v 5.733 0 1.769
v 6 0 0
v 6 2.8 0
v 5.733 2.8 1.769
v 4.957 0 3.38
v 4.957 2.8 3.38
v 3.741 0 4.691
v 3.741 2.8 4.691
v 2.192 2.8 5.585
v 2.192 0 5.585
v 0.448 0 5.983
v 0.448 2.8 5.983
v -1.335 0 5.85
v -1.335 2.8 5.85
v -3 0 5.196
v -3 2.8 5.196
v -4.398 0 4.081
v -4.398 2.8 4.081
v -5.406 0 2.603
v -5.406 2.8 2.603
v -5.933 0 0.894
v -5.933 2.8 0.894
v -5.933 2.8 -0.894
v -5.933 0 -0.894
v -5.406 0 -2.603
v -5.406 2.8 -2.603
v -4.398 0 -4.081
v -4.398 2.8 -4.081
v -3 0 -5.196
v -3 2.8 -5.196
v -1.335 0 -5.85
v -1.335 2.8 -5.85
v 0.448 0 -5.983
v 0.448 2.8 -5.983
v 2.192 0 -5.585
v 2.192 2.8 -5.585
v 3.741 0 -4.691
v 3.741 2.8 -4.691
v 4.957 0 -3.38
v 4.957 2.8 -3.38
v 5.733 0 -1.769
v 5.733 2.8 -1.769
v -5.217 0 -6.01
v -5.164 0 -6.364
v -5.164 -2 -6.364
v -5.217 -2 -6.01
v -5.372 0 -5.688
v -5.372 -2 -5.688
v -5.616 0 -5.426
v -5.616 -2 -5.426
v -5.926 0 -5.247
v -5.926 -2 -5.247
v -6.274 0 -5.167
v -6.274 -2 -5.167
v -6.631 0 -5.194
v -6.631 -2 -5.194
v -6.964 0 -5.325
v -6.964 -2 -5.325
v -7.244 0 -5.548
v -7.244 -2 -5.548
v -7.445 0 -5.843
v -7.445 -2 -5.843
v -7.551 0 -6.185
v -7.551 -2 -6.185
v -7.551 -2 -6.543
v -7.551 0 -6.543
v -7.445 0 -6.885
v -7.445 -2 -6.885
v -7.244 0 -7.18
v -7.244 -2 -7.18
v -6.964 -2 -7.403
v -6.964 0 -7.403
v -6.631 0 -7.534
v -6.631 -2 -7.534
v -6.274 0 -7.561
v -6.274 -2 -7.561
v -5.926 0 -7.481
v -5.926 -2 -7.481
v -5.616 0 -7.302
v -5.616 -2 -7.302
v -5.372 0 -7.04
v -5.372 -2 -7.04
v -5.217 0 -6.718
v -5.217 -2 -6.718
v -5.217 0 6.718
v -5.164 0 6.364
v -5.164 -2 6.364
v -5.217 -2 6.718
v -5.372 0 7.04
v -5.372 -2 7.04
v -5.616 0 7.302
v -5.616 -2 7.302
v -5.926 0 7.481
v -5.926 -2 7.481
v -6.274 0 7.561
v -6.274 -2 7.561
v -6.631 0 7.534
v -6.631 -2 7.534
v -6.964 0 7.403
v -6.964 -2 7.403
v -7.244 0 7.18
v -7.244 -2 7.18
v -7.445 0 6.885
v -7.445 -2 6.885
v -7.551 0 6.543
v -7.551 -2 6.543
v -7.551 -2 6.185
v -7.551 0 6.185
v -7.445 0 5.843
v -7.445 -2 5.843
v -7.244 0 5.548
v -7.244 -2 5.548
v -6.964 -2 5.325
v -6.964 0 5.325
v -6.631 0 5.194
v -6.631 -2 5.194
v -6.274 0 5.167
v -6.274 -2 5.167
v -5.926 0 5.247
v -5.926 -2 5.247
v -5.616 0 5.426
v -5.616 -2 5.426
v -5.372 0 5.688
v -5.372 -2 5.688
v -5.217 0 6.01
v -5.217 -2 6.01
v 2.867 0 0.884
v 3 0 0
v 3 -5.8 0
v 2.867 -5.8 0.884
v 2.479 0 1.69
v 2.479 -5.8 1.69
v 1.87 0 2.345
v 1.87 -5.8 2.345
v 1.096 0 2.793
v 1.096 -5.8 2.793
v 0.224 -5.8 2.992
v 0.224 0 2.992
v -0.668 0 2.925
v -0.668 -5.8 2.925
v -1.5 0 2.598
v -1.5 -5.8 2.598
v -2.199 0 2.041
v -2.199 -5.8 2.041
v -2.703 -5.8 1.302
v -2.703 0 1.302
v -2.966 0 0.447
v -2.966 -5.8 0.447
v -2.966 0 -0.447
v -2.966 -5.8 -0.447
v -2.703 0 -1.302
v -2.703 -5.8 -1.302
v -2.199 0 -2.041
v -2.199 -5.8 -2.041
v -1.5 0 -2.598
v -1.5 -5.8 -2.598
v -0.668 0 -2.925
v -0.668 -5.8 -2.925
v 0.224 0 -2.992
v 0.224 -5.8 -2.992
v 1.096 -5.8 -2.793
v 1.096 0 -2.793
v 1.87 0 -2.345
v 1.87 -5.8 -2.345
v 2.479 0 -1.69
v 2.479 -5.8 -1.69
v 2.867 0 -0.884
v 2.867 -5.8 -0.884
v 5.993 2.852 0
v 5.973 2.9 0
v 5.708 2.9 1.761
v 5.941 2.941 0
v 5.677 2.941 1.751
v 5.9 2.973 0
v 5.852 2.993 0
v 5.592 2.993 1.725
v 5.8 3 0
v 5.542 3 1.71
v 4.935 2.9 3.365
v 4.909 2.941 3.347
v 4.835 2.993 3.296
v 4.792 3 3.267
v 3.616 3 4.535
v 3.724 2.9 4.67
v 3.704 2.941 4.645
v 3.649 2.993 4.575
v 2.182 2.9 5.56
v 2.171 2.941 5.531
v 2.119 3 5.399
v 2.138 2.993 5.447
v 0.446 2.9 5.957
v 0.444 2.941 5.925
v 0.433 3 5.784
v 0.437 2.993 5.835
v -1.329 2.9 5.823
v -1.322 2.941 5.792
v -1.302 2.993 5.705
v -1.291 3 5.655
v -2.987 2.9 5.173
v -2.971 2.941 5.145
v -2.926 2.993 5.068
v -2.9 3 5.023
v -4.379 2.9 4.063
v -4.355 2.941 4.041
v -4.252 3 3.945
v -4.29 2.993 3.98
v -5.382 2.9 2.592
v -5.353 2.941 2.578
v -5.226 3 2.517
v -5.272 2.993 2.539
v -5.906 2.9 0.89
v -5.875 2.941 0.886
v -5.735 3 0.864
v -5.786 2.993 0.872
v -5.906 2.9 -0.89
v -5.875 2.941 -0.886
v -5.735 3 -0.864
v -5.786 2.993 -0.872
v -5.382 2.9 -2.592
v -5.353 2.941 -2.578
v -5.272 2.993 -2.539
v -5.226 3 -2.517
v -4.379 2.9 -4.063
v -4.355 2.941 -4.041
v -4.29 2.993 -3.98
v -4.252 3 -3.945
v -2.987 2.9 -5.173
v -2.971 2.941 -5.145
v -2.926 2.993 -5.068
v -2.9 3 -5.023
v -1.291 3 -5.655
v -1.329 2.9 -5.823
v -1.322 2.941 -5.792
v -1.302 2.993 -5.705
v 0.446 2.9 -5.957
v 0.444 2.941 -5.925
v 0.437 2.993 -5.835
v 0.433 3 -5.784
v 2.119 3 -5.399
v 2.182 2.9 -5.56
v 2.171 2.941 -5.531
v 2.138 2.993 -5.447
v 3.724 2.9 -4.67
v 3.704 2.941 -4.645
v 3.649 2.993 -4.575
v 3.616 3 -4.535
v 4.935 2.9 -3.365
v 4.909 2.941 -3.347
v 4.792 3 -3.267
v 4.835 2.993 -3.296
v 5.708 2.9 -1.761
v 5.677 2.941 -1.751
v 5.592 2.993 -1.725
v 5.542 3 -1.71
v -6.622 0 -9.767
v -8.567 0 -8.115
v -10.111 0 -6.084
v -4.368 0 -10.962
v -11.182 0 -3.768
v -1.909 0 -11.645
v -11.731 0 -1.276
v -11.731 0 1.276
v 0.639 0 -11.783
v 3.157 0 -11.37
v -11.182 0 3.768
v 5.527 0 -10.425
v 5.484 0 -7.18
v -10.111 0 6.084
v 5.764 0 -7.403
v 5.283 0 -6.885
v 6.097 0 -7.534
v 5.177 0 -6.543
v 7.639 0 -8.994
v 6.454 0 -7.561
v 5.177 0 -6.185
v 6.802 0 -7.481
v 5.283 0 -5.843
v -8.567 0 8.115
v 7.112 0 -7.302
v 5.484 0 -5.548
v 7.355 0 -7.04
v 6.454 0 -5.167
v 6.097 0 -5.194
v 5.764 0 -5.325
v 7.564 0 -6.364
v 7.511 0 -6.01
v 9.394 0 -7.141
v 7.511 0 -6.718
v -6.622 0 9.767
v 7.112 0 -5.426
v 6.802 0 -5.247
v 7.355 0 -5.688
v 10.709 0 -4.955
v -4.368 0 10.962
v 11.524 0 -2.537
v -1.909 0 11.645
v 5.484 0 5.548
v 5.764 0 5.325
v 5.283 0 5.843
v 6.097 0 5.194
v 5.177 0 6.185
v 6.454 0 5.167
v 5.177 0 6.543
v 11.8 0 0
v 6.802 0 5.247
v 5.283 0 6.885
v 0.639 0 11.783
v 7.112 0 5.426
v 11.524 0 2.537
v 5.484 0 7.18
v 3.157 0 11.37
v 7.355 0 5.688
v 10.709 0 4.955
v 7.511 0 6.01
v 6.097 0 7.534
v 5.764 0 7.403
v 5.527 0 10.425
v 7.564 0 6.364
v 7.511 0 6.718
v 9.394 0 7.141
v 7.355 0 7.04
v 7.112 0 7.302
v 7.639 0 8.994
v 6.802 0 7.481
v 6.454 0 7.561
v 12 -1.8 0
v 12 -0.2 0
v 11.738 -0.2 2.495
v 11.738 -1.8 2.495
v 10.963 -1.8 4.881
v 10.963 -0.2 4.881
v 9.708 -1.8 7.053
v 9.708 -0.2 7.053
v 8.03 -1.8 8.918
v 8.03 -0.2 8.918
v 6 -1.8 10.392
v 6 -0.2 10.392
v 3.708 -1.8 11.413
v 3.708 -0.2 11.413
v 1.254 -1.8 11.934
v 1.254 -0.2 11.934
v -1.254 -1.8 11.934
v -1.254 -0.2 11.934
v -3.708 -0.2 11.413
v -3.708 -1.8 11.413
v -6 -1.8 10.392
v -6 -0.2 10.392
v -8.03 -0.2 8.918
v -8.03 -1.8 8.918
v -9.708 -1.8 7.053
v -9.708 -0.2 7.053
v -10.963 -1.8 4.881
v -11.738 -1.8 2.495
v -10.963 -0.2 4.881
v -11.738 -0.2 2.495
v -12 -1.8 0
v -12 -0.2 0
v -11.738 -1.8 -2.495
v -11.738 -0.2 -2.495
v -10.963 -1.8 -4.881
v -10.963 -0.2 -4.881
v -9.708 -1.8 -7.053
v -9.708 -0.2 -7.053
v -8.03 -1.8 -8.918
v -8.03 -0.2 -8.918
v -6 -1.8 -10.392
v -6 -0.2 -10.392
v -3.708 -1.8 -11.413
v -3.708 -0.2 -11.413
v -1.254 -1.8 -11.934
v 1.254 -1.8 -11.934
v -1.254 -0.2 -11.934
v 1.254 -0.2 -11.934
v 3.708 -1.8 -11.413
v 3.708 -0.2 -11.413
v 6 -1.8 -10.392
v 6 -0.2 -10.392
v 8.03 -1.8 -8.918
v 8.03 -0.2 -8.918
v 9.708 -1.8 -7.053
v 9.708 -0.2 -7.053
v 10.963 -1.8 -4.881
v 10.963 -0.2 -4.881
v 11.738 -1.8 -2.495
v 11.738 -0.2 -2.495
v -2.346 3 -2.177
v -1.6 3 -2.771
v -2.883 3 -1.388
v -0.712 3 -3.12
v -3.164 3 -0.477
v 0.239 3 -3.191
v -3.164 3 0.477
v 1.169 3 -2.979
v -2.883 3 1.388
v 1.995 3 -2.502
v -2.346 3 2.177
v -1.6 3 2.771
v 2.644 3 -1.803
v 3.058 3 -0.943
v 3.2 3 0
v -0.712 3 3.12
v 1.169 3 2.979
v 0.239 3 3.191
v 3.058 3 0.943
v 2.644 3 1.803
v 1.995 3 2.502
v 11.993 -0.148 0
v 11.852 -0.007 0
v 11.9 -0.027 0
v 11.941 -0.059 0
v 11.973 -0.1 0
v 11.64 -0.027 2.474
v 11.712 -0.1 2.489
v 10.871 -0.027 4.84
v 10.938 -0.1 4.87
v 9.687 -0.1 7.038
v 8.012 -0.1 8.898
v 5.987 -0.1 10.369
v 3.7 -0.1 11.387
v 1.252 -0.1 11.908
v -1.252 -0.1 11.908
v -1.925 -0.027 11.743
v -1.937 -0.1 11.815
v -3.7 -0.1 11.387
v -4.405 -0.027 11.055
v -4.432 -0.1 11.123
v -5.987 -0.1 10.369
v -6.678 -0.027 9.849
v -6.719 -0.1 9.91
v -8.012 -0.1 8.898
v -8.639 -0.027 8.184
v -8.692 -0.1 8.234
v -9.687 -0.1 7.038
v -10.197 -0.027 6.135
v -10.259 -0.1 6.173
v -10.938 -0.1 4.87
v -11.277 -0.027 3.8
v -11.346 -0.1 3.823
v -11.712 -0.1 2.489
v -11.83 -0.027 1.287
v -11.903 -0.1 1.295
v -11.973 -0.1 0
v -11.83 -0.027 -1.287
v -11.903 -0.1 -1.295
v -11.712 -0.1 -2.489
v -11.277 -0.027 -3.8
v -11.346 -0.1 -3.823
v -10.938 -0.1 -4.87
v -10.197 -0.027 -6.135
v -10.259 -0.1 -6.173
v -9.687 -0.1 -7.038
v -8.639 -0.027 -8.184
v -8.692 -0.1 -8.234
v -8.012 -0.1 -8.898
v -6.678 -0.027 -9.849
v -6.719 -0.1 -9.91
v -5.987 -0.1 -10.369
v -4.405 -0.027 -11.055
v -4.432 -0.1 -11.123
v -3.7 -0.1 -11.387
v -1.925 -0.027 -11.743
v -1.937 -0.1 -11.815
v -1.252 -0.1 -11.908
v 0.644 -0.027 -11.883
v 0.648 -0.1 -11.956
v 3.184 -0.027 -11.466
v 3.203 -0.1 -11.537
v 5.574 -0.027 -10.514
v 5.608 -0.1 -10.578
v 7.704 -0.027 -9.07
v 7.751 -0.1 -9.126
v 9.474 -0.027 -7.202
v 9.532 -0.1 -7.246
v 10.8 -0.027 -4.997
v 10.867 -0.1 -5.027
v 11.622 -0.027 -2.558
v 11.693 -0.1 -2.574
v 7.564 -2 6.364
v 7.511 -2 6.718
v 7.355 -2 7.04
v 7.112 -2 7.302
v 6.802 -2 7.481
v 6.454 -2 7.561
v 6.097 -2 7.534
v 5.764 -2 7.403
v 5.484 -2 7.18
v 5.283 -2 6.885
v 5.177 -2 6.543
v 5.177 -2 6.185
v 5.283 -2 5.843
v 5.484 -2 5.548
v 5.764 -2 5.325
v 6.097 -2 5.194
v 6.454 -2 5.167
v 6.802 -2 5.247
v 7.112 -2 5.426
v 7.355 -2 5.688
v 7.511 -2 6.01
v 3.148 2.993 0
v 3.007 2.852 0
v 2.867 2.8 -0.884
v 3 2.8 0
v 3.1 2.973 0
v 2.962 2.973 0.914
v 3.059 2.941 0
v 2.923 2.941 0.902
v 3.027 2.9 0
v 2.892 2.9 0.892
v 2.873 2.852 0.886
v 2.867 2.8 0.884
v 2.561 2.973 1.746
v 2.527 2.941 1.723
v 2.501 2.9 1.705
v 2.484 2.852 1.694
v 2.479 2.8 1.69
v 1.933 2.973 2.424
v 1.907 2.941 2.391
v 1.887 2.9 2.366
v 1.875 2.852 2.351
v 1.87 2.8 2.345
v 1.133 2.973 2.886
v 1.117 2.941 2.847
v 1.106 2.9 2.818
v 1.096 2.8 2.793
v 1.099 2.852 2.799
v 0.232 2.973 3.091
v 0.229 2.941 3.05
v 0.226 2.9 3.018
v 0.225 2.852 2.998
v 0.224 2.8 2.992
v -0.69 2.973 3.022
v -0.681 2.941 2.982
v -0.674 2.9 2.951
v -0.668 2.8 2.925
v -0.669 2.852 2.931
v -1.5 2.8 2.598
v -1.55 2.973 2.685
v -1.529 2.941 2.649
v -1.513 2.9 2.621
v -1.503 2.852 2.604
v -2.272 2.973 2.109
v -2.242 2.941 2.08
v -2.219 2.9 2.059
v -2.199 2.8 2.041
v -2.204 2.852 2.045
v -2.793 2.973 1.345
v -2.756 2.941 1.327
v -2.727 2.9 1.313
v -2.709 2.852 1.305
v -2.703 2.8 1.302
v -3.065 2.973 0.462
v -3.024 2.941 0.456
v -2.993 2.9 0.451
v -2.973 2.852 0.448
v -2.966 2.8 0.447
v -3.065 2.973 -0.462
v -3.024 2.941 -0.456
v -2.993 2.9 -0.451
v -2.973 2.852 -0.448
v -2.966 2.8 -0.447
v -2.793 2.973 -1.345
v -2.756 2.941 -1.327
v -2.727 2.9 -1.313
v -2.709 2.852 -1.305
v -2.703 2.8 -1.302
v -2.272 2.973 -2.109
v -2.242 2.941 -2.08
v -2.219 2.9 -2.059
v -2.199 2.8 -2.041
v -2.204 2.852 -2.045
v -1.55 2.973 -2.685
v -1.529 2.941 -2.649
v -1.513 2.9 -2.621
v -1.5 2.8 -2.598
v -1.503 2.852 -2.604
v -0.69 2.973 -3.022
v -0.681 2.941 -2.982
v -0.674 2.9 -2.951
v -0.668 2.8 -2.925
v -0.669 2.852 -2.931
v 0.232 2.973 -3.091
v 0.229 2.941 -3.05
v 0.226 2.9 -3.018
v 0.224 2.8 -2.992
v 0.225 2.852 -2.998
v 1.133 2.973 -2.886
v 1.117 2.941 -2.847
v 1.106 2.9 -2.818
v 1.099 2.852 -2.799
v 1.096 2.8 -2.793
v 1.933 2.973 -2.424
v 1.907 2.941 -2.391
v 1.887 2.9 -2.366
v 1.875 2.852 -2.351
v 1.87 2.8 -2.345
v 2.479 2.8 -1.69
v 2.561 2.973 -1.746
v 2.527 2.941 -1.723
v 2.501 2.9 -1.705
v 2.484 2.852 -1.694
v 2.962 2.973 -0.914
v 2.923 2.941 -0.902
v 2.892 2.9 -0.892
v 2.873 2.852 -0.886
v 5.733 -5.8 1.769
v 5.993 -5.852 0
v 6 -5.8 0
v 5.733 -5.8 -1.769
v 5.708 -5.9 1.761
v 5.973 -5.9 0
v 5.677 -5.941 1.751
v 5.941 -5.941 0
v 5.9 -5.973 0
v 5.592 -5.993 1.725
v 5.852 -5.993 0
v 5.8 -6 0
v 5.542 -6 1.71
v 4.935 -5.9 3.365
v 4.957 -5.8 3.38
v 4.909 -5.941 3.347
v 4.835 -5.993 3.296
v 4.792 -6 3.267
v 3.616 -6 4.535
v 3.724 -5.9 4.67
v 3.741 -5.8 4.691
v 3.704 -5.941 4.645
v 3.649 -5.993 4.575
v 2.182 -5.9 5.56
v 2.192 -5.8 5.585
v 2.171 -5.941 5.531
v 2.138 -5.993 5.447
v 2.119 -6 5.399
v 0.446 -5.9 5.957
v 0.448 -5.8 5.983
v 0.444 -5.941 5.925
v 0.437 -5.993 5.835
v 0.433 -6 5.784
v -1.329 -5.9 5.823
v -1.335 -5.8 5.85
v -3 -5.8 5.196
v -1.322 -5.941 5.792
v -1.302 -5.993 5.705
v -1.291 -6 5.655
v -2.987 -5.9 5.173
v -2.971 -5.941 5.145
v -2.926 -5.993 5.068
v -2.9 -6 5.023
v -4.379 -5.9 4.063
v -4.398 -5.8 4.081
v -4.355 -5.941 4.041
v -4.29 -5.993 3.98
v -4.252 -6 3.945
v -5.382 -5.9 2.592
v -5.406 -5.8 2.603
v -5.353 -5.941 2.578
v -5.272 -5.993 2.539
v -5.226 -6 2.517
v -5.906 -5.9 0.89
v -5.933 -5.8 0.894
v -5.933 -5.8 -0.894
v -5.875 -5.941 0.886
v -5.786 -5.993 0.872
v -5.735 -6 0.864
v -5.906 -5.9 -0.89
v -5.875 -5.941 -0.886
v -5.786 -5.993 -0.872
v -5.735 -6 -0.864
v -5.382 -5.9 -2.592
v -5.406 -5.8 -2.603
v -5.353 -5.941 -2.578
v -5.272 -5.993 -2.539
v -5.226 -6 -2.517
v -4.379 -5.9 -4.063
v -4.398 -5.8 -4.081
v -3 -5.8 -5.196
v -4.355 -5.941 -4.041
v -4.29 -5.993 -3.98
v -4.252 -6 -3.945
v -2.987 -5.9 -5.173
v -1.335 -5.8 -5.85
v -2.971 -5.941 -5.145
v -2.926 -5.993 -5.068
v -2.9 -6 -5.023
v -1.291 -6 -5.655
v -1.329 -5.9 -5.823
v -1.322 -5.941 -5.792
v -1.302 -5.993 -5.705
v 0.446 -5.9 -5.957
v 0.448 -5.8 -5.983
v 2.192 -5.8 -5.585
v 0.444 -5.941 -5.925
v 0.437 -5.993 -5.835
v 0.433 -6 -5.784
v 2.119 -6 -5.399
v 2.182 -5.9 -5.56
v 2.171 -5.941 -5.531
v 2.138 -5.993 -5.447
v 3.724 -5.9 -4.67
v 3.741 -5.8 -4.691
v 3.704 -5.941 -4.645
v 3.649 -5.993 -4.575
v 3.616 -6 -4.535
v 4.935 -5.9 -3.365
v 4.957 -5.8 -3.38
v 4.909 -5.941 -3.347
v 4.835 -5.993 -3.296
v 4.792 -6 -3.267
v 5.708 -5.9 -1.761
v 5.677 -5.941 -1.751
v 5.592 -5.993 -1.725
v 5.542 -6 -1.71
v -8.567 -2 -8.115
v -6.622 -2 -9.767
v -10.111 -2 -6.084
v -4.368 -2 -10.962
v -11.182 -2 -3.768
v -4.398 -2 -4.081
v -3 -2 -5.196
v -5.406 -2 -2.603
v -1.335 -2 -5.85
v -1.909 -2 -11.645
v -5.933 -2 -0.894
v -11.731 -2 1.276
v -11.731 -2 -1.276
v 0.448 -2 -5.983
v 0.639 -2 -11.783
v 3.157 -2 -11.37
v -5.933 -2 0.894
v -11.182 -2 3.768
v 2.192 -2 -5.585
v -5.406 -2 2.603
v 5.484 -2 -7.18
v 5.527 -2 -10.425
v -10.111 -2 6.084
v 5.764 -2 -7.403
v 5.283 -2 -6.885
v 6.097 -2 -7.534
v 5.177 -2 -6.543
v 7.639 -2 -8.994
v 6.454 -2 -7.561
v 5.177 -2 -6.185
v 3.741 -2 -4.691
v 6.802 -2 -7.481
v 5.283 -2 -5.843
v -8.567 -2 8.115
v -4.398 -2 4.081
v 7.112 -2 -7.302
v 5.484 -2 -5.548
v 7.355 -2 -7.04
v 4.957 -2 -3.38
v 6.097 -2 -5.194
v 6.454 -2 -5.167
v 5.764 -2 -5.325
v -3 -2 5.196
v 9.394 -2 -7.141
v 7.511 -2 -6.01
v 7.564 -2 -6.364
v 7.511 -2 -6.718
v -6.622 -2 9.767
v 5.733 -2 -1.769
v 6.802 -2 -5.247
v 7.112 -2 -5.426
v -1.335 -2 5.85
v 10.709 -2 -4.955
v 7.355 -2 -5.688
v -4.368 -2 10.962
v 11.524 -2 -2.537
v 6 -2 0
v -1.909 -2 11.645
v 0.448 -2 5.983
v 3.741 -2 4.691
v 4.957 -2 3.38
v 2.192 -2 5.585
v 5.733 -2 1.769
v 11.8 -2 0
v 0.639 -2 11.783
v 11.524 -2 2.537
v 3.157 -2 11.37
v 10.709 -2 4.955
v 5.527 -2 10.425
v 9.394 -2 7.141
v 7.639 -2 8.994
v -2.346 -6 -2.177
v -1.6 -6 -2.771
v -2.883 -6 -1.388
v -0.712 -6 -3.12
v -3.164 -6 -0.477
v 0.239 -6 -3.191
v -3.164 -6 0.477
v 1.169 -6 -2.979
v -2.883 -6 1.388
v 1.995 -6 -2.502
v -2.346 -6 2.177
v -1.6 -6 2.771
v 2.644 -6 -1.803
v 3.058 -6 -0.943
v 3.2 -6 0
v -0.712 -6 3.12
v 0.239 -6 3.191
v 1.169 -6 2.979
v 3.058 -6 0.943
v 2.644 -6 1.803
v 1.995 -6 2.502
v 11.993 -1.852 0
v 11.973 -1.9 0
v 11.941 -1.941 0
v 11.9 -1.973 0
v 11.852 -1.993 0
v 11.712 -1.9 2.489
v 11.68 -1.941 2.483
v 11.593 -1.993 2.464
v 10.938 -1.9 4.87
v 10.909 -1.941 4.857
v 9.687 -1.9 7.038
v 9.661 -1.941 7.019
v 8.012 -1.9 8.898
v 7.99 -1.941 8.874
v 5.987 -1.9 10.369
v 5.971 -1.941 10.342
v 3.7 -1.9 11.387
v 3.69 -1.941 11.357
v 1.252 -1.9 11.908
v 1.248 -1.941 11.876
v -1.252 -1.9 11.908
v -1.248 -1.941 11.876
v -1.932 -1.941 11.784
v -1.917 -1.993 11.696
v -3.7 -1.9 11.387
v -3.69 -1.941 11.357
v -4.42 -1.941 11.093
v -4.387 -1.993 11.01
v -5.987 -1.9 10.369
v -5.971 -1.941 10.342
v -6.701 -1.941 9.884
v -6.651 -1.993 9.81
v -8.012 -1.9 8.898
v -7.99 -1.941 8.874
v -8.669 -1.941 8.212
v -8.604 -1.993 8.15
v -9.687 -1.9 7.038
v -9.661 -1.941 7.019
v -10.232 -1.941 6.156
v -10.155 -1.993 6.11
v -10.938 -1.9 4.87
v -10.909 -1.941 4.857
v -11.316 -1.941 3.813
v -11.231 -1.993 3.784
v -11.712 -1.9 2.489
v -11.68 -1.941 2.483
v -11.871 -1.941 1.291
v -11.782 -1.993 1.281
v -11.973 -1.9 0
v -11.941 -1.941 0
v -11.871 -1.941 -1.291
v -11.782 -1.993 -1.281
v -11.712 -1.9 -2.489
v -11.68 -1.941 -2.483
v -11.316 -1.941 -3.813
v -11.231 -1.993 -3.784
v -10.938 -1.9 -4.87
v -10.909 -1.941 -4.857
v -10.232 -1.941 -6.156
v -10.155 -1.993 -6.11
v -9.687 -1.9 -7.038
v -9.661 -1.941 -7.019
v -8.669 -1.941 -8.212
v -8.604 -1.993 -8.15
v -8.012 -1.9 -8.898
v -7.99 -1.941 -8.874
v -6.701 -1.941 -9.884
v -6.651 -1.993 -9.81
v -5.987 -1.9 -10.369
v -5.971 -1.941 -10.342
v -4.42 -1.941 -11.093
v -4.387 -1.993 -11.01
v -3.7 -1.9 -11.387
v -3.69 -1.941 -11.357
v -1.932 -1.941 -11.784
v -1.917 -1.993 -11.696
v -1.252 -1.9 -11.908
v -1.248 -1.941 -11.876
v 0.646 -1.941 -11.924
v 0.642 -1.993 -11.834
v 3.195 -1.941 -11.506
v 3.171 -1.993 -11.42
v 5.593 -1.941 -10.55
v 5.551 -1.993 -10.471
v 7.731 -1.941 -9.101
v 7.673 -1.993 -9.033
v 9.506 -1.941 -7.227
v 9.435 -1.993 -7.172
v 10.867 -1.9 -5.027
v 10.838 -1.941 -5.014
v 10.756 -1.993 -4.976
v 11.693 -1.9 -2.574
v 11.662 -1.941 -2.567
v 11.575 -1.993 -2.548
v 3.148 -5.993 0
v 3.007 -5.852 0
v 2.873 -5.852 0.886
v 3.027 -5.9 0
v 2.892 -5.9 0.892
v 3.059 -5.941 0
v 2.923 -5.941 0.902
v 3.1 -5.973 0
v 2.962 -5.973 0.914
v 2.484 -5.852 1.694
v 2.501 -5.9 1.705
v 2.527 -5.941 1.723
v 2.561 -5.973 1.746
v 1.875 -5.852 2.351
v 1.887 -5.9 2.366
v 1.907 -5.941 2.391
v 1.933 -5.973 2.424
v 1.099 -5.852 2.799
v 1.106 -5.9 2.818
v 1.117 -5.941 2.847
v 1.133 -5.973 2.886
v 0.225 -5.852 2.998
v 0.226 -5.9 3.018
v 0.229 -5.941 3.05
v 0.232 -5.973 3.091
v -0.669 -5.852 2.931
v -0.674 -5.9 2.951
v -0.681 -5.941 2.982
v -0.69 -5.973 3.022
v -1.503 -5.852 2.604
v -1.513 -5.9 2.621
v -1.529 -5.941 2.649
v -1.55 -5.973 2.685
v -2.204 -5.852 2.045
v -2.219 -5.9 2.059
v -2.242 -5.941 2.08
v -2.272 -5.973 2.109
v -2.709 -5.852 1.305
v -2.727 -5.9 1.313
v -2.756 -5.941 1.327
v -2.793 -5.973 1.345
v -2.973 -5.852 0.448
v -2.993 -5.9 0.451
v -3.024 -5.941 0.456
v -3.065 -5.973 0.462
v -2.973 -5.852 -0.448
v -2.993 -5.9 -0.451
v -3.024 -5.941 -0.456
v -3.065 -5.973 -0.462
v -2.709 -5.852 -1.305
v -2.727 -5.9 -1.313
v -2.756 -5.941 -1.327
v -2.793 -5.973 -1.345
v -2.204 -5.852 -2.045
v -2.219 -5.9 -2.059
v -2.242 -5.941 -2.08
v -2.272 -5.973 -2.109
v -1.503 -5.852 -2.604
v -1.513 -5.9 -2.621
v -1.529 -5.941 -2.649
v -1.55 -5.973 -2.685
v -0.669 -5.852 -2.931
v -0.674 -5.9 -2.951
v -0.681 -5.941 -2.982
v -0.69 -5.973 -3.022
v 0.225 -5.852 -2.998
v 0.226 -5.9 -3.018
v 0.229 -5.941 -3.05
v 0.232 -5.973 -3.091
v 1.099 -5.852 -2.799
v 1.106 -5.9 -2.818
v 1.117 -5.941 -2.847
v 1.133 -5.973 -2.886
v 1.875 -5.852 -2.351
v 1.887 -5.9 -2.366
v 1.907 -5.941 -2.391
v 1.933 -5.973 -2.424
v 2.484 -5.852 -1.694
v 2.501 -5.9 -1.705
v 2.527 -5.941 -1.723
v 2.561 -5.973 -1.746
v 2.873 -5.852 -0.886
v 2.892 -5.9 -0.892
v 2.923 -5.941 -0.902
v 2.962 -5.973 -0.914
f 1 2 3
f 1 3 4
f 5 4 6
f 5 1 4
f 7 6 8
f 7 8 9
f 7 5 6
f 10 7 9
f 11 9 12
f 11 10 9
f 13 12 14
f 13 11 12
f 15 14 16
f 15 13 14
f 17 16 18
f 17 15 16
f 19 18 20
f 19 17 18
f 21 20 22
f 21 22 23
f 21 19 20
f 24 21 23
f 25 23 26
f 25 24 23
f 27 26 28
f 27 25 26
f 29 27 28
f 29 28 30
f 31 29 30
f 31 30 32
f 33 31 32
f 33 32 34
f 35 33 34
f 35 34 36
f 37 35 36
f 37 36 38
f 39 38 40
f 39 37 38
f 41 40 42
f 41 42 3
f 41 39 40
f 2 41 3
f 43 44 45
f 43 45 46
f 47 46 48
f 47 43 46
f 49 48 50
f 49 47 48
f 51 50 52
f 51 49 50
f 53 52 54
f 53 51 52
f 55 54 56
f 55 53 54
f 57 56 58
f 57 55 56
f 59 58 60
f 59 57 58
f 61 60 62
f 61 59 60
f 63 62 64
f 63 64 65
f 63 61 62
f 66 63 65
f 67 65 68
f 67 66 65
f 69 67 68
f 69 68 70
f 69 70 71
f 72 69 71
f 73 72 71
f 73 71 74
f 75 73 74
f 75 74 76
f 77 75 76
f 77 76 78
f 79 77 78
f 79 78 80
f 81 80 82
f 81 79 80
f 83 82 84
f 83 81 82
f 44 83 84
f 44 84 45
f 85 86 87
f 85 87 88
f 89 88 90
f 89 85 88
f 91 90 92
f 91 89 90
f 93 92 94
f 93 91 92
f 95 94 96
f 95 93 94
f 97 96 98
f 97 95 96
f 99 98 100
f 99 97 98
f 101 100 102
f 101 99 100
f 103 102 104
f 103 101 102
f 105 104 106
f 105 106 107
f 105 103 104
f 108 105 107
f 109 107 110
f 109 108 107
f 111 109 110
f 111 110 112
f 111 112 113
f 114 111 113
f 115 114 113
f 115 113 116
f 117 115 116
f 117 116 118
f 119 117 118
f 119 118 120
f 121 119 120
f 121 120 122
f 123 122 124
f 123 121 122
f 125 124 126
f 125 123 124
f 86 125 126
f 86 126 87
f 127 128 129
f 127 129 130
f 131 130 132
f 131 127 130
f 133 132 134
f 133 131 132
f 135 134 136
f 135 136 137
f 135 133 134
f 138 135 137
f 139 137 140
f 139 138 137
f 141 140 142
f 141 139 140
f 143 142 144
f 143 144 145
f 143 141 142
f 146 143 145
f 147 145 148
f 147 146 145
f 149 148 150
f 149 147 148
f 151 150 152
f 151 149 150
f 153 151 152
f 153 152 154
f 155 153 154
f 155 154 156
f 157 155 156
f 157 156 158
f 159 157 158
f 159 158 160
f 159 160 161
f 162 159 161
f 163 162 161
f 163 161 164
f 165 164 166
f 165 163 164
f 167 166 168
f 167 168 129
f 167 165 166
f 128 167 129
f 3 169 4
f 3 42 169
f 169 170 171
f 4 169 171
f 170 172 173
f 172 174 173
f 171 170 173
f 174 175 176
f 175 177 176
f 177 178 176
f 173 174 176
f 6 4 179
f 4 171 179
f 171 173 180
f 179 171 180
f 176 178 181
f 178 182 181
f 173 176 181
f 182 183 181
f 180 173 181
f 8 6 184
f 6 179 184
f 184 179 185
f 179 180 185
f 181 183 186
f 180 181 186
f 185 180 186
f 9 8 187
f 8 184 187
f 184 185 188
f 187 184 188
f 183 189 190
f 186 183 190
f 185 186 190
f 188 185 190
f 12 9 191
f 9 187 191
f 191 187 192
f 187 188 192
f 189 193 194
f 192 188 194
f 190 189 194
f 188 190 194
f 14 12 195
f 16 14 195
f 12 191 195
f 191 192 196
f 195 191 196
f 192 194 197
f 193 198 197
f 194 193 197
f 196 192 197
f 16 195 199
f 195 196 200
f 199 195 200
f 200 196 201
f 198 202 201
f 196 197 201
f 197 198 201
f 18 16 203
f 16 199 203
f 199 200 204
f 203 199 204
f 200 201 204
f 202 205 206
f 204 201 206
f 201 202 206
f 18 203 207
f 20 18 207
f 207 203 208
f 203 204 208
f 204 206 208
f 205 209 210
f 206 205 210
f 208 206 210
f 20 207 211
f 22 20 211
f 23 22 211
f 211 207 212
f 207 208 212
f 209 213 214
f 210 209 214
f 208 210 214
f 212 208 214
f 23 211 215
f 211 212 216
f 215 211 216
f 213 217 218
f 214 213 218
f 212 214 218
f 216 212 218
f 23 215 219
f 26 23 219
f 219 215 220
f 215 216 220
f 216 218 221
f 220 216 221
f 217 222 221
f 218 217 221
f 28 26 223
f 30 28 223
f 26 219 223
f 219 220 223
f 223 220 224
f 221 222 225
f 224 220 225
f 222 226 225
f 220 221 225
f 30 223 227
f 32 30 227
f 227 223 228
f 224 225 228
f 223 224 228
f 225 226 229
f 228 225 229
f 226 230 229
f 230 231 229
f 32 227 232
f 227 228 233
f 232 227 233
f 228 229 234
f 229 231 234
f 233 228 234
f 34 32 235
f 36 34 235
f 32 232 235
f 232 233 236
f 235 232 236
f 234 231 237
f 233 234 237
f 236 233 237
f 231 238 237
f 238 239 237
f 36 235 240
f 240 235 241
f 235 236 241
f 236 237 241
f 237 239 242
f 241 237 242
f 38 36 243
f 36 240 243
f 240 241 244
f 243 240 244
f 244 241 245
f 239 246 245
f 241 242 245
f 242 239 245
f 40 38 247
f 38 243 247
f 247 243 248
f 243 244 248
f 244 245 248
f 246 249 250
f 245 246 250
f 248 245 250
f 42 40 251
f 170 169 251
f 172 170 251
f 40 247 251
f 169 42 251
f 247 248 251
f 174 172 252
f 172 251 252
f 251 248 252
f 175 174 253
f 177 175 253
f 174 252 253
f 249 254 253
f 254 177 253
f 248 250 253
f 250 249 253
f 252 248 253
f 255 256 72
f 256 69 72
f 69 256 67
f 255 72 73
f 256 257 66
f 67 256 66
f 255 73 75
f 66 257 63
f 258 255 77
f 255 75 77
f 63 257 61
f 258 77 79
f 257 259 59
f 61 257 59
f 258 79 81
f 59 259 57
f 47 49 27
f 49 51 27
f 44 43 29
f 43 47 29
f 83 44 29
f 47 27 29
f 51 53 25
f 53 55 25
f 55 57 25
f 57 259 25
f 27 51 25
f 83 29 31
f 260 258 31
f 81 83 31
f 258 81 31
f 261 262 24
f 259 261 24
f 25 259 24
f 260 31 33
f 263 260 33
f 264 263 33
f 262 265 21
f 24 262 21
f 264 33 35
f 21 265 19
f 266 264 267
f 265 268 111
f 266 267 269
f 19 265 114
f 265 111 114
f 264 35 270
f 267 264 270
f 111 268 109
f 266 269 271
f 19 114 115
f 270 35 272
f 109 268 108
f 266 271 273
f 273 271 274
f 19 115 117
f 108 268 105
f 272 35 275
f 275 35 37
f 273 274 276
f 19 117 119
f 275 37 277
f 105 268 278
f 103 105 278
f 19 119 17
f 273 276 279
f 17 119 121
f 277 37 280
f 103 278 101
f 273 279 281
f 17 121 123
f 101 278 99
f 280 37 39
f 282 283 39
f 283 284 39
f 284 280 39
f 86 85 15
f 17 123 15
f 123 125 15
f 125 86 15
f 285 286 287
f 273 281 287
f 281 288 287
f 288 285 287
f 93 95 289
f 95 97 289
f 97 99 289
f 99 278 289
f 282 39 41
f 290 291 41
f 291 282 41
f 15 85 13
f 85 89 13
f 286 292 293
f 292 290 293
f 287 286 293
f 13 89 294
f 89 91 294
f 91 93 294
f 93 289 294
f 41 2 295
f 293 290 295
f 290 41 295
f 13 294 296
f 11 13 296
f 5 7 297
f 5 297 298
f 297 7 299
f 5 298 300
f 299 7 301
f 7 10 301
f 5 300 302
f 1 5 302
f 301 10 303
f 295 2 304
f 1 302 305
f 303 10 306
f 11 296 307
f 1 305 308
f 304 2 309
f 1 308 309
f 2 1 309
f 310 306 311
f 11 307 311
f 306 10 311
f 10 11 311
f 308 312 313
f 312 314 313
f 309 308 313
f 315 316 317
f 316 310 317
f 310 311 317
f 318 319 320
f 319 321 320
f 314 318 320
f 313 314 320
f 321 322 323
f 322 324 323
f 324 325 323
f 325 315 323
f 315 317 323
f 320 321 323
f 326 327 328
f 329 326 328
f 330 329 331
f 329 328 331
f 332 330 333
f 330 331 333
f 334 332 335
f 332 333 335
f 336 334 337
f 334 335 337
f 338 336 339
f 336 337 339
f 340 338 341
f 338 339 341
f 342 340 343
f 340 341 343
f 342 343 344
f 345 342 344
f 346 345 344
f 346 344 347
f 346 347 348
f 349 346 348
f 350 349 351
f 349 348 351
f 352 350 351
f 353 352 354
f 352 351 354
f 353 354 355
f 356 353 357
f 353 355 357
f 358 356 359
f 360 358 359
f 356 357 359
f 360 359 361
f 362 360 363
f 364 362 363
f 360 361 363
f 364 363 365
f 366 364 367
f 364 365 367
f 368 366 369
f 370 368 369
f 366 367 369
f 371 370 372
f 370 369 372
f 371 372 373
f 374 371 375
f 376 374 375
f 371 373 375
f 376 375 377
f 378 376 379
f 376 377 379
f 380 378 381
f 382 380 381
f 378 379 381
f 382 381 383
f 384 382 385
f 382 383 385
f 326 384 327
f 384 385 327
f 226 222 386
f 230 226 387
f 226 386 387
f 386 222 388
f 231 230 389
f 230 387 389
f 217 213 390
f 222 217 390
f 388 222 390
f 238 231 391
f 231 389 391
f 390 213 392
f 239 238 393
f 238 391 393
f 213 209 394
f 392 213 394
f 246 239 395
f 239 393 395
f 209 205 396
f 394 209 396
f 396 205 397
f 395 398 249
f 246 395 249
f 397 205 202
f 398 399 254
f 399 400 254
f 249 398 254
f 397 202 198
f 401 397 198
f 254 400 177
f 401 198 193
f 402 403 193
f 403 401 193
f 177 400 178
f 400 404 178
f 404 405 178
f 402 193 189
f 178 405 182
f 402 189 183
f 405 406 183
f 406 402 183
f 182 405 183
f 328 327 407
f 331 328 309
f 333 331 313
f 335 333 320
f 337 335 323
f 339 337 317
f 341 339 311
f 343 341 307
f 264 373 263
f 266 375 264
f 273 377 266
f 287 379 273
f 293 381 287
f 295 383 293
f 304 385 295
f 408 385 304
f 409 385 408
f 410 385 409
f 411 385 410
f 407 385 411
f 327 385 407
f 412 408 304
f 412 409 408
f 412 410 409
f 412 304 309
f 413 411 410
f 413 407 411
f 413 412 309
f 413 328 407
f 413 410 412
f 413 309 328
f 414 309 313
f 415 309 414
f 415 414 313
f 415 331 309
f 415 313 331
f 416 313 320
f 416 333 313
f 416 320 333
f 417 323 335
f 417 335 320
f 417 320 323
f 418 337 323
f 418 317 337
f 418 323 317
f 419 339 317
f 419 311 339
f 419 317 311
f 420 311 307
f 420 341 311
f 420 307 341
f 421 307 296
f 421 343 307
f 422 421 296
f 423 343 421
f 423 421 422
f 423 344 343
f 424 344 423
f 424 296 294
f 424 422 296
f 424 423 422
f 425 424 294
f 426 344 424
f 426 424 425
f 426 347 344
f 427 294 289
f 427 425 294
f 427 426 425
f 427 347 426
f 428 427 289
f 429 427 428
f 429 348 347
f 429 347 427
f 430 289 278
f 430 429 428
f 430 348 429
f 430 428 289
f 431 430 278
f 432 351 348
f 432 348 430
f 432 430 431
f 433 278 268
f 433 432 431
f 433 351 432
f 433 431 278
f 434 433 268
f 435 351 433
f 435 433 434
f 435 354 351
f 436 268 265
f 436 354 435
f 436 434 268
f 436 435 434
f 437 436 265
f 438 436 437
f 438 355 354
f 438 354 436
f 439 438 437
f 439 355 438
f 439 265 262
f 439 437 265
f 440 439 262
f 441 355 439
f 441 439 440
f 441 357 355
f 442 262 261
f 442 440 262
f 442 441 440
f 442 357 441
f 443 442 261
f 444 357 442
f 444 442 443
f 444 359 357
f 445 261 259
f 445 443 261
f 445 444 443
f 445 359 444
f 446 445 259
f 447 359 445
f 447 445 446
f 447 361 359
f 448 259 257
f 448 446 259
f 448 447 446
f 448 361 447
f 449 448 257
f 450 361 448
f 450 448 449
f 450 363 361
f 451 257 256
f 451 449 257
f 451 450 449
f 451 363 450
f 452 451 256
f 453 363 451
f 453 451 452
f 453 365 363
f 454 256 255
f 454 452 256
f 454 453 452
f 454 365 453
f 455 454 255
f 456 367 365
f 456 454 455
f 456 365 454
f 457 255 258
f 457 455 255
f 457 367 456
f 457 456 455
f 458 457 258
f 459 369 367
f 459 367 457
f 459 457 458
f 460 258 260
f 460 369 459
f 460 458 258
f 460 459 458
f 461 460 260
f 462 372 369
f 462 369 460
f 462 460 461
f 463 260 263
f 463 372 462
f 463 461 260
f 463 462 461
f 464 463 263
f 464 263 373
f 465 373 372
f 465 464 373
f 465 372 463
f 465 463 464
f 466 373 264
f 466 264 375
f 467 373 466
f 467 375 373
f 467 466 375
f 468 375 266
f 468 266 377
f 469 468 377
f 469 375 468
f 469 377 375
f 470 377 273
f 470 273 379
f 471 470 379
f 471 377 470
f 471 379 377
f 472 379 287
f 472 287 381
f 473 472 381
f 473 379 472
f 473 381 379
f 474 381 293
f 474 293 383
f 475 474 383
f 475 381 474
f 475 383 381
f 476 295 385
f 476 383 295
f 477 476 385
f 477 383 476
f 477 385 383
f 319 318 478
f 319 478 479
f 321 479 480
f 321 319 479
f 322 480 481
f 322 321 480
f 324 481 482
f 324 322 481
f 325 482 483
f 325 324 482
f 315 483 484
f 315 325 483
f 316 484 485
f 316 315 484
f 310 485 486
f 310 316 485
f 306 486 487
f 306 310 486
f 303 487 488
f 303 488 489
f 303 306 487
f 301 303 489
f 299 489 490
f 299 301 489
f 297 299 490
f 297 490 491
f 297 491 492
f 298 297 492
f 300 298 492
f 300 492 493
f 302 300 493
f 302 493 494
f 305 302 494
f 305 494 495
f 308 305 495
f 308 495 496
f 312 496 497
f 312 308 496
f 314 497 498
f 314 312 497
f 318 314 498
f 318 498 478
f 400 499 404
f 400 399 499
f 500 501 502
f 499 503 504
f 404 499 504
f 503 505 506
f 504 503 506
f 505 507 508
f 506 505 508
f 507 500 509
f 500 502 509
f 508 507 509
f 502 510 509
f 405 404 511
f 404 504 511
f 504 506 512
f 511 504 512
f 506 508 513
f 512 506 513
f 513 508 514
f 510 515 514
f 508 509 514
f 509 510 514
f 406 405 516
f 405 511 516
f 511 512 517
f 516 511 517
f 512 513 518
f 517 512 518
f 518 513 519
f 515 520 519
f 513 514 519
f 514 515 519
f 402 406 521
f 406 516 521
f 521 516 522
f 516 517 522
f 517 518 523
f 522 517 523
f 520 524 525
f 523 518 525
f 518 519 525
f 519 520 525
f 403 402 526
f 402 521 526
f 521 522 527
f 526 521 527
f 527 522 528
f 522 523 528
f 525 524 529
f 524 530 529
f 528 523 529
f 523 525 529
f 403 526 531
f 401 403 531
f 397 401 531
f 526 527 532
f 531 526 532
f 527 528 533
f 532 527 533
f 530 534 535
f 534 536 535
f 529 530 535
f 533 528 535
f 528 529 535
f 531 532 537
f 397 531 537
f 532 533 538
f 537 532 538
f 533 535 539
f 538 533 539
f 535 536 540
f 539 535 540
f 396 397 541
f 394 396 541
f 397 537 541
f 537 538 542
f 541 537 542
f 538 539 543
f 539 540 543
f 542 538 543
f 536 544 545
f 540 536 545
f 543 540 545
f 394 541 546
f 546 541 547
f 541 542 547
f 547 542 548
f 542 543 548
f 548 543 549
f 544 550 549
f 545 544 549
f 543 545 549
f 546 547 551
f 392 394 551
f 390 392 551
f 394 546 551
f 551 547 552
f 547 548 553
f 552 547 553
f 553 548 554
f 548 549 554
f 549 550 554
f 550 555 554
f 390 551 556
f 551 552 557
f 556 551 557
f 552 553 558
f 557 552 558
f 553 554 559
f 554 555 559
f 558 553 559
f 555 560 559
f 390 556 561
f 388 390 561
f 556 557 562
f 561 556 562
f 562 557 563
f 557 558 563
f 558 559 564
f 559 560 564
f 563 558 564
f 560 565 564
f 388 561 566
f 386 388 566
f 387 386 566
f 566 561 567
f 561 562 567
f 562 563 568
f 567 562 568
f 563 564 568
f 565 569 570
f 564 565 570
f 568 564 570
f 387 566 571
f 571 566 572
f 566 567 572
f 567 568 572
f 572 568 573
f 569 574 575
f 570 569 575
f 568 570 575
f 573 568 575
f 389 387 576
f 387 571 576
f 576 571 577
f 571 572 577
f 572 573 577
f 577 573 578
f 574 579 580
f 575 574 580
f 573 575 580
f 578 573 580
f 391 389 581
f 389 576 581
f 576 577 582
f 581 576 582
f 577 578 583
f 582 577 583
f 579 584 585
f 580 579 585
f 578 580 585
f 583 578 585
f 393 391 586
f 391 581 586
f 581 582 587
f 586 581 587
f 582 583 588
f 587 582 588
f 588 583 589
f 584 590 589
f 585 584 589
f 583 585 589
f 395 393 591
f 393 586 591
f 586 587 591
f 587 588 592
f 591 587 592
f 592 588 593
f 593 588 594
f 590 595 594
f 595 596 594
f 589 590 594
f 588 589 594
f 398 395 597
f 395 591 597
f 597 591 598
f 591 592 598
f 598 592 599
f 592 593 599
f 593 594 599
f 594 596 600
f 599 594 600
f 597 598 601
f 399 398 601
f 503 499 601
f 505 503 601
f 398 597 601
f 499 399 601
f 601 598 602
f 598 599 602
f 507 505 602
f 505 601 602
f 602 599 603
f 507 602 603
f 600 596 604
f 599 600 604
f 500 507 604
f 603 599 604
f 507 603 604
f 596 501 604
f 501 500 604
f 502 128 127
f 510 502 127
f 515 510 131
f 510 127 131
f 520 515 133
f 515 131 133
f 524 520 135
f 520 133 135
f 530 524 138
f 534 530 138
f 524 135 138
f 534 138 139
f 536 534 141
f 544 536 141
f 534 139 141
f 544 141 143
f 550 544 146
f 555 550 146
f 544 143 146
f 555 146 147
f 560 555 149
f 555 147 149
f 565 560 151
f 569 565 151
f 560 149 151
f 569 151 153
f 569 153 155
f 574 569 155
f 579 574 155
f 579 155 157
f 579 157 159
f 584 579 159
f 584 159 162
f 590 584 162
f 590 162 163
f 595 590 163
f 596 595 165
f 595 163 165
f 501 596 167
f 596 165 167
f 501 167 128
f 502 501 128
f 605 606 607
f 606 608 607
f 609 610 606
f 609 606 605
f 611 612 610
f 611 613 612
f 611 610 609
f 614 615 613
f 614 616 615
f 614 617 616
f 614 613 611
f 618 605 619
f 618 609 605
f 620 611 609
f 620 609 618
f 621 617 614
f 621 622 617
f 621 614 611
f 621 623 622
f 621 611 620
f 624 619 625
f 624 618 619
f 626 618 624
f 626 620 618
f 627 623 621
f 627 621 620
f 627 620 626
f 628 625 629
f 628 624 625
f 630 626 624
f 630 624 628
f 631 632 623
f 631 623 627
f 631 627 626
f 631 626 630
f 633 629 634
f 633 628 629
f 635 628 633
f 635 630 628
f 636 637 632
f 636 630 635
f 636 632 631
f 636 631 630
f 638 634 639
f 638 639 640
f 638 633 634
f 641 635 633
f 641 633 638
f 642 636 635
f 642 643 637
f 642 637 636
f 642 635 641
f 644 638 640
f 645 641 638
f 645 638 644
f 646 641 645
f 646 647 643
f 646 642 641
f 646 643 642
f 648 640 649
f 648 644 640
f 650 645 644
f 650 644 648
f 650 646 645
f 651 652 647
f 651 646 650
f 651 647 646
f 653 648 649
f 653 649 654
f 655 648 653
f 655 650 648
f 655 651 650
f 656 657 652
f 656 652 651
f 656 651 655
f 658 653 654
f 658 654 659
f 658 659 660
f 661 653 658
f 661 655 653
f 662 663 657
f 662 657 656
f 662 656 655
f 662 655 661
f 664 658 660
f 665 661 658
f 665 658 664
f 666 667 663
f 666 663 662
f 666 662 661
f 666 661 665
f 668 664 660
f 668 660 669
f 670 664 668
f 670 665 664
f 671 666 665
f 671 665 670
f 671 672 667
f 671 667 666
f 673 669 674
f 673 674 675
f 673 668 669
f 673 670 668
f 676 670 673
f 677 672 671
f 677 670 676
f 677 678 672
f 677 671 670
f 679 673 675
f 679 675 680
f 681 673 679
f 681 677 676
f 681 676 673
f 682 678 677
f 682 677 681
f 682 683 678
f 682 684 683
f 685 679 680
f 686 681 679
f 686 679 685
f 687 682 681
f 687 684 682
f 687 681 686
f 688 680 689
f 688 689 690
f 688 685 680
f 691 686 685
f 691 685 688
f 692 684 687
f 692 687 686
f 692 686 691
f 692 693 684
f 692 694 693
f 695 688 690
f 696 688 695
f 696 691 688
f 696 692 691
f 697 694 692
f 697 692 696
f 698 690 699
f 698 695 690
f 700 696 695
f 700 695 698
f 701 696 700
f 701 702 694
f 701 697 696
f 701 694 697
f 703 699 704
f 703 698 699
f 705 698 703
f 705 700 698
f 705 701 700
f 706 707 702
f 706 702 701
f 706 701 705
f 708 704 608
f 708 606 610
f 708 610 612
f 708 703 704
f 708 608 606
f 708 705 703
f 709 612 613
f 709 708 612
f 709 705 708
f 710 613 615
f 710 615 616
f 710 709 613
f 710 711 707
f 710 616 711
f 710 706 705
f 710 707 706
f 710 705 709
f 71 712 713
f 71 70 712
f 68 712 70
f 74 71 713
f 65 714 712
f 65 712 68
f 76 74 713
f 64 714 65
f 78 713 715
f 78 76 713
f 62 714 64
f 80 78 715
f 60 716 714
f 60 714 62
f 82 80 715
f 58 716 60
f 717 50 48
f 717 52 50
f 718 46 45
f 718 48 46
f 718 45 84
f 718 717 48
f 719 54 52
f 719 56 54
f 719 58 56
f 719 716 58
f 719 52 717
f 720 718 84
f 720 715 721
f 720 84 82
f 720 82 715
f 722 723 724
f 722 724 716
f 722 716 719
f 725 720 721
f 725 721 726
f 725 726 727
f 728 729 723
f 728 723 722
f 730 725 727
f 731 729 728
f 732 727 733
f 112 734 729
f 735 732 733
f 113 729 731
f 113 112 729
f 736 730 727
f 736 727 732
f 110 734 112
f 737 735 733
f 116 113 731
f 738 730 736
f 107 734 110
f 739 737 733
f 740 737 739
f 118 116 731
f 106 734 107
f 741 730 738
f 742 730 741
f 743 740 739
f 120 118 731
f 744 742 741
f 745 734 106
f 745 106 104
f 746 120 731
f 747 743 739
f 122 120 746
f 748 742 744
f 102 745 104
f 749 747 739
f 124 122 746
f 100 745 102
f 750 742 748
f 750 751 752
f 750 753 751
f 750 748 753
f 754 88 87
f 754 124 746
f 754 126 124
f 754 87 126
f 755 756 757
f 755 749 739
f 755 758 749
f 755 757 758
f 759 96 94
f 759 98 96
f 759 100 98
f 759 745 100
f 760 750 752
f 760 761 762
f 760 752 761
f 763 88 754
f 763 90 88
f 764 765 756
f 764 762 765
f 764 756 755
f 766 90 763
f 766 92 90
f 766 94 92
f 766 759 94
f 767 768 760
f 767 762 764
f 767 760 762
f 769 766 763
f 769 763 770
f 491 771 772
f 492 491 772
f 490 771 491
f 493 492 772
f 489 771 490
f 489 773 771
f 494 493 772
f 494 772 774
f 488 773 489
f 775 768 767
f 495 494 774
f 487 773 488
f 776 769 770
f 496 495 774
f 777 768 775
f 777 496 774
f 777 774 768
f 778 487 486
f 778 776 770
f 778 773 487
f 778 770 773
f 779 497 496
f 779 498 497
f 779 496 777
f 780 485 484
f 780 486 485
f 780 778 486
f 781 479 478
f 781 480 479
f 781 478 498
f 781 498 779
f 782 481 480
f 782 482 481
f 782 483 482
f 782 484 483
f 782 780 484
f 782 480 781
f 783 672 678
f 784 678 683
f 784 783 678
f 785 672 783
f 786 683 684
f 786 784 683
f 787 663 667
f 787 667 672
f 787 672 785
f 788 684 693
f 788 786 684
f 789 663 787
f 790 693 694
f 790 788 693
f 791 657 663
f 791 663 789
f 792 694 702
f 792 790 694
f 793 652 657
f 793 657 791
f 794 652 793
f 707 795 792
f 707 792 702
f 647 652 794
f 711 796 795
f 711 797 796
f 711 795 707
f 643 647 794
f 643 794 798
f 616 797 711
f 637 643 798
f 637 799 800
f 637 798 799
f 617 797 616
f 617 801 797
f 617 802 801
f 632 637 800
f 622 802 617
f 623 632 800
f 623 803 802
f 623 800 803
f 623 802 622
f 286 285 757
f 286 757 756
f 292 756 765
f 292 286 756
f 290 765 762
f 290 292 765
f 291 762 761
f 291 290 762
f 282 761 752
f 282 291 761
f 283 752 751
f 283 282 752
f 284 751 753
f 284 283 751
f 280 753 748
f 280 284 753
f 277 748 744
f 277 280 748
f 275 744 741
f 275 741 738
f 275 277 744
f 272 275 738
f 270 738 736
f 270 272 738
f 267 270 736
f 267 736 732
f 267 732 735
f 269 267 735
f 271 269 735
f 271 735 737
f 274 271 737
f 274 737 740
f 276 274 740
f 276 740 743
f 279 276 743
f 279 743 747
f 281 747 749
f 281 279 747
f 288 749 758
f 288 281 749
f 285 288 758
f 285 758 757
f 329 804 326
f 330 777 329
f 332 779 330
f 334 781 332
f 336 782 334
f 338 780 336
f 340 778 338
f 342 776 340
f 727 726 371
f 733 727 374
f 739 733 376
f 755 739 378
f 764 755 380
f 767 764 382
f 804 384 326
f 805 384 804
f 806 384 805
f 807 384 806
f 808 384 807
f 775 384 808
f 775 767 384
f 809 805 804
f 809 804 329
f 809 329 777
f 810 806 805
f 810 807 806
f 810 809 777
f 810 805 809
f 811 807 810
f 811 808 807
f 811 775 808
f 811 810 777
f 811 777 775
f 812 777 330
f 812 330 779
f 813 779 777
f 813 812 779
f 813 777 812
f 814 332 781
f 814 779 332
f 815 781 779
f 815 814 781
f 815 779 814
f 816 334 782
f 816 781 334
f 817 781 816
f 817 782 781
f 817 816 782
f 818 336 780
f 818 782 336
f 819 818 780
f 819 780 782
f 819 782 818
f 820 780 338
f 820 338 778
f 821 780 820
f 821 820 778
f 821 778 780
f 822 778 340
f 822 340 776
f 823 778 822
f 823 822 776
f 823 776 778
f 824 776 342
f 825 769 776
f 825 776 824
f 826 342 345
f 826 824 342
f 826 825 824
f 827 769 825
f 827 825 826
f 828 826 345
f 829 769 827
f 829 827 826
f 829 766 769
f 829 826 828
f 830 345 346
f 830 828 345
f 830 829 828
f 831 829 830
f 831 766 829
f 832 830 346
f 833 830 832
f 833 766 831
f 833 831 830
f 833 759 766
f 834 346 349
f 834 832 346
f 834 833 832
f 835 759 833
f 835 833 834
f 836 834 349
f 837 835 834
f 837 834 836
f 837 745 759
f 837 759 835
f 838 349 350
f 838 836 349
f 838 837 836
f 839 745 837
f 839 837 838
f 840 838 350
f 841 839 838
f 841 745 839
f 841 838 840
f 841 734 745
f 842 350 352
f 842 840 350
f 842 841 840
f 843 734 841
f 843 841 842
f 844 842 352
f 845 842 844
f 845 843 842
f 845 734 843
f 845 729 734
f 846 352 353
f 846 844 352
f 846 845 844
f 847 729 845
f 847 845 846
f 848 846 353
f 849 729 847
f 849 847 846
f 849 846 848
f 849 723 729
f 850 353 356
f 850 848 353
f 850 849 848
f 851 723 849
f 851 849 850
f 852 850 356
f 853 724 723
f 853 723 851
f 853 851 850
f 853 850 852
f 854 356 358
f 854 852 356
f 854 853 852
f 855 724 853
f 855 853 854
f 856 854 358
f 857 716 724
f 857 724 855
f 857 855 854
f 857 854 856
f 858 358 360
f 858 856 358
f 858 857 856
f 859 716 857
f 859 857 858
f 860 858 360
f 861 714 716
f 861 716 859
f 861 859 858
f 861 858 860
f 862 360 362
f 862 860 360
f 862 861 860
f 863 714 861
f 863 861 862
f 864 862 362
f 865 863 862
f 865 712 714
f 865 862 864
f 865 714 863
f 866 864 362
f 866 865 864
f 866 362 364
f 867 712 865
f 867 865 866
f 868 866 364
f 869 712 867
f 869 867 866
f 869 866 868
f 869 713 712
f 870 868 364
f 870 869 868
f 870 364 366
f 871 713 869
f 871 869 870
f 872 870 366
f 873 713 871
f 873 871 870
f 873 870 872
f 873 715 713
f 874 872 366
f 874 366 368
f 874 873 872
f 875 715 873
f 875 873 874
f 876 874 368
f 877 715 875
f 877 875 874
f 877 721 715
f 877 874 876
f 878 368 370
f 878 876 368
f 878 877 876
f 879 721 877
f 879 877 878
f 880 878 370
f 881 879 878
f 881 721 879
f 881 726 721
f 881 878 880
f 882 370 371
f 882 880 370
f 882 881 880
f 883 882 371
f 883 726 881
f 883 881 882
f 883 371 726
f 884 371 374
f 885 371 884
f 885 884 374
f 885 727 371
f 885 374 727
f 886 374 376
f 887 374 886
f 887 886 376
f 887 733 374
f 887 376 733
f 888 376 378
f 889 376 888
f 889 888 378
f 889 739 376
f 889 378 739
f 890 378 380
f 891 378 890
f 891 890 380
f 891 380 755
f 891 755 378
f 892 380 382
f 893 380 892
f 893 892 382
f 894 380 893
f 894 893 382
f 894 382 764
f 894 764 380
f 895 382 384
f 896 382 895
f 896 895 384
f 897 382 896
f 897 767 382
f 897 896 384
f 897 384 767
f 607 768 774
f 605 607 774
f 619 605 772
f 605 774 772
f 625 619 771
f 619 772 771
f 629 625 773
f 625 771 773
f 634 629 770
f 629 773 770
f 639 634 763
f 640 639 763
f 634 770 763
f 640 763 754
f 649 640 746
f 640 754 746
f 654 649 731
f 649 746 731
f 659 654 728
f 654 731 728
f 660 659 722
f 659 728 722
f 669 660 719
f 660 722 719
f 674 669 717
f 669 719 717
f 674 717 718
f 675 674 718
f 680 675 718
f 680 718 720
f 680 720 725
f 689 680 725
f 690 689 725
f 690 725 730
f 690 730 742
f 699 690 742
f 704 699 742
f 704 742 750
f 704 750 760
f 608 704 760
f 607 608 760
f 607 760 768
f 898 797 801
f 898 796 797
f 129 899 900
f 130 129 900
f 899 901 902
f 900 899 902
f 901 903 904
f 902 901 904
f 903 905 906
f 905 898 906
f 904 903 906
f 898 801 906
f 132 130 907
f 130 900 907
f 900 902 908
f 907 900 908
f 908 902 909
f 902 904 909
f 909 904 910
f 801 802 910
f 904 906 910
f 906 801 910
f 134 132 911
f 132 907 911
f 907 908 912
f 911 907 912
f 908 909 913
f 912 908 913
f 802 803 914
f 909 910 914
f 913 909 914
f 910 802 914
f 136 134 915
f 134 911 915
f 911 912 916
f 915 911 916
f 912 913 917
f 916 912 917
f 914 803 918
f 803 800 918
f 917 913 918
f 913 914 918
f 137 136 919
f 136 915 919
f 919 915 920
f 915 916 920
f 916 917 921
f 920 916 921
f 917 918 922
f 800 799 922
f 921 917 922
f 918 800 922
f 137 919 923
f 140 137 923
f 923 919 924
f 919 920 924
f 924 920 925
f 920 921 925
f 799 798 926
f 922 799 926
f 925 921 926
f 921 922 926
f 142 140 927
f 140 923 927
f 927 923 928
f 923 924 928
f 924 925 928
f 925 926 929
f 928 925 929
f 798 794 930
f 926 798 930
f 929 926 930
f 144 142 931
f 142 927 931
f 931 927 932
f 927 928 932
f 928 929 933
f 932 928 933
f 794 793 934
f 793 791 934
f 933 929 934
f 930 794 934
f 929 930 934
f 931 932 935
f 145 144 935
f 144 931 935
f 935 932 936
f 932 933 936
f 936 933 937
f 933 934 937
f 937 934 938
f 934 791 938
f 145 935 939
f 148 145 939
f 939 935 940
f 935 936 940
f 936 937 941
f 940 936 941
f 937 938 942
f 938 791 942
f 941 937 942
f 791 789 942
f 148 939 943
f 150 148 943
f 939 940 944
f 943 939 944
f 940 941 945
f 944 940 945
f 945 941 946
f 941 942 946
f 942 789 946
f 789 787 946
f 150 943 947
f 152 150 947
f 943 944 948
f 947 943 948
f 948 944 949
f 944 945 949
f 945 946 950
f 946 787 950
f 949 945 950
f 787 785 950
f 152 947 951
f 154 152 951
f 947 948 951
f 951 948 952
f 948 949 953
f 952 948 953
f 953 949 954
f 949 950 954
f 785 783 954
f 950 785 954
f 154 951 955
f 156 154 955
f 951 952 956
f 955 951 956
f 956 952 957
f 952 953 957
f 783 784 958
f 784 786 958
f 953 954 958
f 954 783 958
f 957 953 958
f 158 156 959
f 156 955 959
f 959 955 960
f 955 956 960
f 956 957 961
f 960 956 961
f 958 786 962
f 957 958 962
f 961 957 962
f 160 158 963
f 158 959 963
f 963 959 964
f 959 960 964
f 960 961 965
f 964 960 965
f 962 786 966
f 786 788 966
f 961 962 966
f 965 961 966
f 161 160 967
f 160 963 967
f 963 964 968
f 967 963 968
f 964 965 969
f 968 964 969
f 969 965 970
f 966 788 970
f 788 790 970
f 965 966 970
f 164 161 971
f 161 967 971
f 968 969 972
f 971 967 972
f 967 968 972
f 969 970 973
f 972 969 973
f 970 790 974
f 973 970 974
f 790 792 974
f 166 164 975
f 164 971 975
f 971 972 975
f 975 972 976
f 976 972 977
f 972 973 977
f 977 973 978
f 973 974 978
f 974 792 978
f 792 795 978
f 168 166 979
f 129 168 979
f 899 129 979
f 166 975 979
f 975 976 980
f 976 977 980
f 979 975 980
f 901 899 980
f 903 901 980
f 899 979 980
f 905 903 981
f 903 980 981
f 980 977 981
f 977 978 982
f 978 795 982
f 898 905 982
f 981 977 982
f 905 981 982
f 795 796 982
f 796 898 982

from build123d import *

# Parameters (mm, degrees)
F0_R     = 12
F0_R_2   = 1.2
F0_R_3   = 6
F1_DEPTH = 2
F0_R_4   = 3
F2_DEPTH = 6
F3_DEPTH = 3
F4_R     = 0.2


with BuildPart() as f1:
    # F0 (on Front) → F1 (new body)
    with BuildSketch(Plane.XZ):
        Circle(F0_R)
        with Locations((-6.363961, -6.363961)):
            Circle(F0_R_2, mode=Mode.SUBTRACT)
        with Locations((6.363961, -6.363961)):
            Circle(F0_R_2, mode=Mode.SUBTRACT)
        with Locations((-6.363961, 6.363961)):
            Circle(F0_R_2, mode=Mode.SUBTRACT)
        Circle(F0_R_3, mode=Mode.SUBTRACT)
        with Locations((6.363961, 6.363961)):
            Circle(F0_R_2, mode=Mode.SUBTRACT)
    extrude(amount=F1_DEPTH)

    # F0 (on Front) → F2 (join)
    with BuildSketch(Plane.XZ):
        Circle(F0_R_3)
        Circle(F0_R_4, mode=Mode.SUBTRACT)
    extrude(amount=F2_DEPTH)

    # F0 (on Front) → F3 (join)
    with BuildSketch(Plane.XZ):
        Circle(F0_R_3)
        Circle(F0_R_4, mode=Mode.SUBTRACT)
    extrude(amount=-F3_DEPTH)

    # F4
    f4_edges = [f1.edges().sort_by_distance(p)[0] for p in [
        (-6, -6, 0),
        (-3, -6, 0),
        (-12, -2, 0),
        (-12, 0, 0),
        (-6, 3, 0),
        (-3, 3, 0),
    ]]
    fillet(f4_edges, radius=F4_R)


solid = f1.part
